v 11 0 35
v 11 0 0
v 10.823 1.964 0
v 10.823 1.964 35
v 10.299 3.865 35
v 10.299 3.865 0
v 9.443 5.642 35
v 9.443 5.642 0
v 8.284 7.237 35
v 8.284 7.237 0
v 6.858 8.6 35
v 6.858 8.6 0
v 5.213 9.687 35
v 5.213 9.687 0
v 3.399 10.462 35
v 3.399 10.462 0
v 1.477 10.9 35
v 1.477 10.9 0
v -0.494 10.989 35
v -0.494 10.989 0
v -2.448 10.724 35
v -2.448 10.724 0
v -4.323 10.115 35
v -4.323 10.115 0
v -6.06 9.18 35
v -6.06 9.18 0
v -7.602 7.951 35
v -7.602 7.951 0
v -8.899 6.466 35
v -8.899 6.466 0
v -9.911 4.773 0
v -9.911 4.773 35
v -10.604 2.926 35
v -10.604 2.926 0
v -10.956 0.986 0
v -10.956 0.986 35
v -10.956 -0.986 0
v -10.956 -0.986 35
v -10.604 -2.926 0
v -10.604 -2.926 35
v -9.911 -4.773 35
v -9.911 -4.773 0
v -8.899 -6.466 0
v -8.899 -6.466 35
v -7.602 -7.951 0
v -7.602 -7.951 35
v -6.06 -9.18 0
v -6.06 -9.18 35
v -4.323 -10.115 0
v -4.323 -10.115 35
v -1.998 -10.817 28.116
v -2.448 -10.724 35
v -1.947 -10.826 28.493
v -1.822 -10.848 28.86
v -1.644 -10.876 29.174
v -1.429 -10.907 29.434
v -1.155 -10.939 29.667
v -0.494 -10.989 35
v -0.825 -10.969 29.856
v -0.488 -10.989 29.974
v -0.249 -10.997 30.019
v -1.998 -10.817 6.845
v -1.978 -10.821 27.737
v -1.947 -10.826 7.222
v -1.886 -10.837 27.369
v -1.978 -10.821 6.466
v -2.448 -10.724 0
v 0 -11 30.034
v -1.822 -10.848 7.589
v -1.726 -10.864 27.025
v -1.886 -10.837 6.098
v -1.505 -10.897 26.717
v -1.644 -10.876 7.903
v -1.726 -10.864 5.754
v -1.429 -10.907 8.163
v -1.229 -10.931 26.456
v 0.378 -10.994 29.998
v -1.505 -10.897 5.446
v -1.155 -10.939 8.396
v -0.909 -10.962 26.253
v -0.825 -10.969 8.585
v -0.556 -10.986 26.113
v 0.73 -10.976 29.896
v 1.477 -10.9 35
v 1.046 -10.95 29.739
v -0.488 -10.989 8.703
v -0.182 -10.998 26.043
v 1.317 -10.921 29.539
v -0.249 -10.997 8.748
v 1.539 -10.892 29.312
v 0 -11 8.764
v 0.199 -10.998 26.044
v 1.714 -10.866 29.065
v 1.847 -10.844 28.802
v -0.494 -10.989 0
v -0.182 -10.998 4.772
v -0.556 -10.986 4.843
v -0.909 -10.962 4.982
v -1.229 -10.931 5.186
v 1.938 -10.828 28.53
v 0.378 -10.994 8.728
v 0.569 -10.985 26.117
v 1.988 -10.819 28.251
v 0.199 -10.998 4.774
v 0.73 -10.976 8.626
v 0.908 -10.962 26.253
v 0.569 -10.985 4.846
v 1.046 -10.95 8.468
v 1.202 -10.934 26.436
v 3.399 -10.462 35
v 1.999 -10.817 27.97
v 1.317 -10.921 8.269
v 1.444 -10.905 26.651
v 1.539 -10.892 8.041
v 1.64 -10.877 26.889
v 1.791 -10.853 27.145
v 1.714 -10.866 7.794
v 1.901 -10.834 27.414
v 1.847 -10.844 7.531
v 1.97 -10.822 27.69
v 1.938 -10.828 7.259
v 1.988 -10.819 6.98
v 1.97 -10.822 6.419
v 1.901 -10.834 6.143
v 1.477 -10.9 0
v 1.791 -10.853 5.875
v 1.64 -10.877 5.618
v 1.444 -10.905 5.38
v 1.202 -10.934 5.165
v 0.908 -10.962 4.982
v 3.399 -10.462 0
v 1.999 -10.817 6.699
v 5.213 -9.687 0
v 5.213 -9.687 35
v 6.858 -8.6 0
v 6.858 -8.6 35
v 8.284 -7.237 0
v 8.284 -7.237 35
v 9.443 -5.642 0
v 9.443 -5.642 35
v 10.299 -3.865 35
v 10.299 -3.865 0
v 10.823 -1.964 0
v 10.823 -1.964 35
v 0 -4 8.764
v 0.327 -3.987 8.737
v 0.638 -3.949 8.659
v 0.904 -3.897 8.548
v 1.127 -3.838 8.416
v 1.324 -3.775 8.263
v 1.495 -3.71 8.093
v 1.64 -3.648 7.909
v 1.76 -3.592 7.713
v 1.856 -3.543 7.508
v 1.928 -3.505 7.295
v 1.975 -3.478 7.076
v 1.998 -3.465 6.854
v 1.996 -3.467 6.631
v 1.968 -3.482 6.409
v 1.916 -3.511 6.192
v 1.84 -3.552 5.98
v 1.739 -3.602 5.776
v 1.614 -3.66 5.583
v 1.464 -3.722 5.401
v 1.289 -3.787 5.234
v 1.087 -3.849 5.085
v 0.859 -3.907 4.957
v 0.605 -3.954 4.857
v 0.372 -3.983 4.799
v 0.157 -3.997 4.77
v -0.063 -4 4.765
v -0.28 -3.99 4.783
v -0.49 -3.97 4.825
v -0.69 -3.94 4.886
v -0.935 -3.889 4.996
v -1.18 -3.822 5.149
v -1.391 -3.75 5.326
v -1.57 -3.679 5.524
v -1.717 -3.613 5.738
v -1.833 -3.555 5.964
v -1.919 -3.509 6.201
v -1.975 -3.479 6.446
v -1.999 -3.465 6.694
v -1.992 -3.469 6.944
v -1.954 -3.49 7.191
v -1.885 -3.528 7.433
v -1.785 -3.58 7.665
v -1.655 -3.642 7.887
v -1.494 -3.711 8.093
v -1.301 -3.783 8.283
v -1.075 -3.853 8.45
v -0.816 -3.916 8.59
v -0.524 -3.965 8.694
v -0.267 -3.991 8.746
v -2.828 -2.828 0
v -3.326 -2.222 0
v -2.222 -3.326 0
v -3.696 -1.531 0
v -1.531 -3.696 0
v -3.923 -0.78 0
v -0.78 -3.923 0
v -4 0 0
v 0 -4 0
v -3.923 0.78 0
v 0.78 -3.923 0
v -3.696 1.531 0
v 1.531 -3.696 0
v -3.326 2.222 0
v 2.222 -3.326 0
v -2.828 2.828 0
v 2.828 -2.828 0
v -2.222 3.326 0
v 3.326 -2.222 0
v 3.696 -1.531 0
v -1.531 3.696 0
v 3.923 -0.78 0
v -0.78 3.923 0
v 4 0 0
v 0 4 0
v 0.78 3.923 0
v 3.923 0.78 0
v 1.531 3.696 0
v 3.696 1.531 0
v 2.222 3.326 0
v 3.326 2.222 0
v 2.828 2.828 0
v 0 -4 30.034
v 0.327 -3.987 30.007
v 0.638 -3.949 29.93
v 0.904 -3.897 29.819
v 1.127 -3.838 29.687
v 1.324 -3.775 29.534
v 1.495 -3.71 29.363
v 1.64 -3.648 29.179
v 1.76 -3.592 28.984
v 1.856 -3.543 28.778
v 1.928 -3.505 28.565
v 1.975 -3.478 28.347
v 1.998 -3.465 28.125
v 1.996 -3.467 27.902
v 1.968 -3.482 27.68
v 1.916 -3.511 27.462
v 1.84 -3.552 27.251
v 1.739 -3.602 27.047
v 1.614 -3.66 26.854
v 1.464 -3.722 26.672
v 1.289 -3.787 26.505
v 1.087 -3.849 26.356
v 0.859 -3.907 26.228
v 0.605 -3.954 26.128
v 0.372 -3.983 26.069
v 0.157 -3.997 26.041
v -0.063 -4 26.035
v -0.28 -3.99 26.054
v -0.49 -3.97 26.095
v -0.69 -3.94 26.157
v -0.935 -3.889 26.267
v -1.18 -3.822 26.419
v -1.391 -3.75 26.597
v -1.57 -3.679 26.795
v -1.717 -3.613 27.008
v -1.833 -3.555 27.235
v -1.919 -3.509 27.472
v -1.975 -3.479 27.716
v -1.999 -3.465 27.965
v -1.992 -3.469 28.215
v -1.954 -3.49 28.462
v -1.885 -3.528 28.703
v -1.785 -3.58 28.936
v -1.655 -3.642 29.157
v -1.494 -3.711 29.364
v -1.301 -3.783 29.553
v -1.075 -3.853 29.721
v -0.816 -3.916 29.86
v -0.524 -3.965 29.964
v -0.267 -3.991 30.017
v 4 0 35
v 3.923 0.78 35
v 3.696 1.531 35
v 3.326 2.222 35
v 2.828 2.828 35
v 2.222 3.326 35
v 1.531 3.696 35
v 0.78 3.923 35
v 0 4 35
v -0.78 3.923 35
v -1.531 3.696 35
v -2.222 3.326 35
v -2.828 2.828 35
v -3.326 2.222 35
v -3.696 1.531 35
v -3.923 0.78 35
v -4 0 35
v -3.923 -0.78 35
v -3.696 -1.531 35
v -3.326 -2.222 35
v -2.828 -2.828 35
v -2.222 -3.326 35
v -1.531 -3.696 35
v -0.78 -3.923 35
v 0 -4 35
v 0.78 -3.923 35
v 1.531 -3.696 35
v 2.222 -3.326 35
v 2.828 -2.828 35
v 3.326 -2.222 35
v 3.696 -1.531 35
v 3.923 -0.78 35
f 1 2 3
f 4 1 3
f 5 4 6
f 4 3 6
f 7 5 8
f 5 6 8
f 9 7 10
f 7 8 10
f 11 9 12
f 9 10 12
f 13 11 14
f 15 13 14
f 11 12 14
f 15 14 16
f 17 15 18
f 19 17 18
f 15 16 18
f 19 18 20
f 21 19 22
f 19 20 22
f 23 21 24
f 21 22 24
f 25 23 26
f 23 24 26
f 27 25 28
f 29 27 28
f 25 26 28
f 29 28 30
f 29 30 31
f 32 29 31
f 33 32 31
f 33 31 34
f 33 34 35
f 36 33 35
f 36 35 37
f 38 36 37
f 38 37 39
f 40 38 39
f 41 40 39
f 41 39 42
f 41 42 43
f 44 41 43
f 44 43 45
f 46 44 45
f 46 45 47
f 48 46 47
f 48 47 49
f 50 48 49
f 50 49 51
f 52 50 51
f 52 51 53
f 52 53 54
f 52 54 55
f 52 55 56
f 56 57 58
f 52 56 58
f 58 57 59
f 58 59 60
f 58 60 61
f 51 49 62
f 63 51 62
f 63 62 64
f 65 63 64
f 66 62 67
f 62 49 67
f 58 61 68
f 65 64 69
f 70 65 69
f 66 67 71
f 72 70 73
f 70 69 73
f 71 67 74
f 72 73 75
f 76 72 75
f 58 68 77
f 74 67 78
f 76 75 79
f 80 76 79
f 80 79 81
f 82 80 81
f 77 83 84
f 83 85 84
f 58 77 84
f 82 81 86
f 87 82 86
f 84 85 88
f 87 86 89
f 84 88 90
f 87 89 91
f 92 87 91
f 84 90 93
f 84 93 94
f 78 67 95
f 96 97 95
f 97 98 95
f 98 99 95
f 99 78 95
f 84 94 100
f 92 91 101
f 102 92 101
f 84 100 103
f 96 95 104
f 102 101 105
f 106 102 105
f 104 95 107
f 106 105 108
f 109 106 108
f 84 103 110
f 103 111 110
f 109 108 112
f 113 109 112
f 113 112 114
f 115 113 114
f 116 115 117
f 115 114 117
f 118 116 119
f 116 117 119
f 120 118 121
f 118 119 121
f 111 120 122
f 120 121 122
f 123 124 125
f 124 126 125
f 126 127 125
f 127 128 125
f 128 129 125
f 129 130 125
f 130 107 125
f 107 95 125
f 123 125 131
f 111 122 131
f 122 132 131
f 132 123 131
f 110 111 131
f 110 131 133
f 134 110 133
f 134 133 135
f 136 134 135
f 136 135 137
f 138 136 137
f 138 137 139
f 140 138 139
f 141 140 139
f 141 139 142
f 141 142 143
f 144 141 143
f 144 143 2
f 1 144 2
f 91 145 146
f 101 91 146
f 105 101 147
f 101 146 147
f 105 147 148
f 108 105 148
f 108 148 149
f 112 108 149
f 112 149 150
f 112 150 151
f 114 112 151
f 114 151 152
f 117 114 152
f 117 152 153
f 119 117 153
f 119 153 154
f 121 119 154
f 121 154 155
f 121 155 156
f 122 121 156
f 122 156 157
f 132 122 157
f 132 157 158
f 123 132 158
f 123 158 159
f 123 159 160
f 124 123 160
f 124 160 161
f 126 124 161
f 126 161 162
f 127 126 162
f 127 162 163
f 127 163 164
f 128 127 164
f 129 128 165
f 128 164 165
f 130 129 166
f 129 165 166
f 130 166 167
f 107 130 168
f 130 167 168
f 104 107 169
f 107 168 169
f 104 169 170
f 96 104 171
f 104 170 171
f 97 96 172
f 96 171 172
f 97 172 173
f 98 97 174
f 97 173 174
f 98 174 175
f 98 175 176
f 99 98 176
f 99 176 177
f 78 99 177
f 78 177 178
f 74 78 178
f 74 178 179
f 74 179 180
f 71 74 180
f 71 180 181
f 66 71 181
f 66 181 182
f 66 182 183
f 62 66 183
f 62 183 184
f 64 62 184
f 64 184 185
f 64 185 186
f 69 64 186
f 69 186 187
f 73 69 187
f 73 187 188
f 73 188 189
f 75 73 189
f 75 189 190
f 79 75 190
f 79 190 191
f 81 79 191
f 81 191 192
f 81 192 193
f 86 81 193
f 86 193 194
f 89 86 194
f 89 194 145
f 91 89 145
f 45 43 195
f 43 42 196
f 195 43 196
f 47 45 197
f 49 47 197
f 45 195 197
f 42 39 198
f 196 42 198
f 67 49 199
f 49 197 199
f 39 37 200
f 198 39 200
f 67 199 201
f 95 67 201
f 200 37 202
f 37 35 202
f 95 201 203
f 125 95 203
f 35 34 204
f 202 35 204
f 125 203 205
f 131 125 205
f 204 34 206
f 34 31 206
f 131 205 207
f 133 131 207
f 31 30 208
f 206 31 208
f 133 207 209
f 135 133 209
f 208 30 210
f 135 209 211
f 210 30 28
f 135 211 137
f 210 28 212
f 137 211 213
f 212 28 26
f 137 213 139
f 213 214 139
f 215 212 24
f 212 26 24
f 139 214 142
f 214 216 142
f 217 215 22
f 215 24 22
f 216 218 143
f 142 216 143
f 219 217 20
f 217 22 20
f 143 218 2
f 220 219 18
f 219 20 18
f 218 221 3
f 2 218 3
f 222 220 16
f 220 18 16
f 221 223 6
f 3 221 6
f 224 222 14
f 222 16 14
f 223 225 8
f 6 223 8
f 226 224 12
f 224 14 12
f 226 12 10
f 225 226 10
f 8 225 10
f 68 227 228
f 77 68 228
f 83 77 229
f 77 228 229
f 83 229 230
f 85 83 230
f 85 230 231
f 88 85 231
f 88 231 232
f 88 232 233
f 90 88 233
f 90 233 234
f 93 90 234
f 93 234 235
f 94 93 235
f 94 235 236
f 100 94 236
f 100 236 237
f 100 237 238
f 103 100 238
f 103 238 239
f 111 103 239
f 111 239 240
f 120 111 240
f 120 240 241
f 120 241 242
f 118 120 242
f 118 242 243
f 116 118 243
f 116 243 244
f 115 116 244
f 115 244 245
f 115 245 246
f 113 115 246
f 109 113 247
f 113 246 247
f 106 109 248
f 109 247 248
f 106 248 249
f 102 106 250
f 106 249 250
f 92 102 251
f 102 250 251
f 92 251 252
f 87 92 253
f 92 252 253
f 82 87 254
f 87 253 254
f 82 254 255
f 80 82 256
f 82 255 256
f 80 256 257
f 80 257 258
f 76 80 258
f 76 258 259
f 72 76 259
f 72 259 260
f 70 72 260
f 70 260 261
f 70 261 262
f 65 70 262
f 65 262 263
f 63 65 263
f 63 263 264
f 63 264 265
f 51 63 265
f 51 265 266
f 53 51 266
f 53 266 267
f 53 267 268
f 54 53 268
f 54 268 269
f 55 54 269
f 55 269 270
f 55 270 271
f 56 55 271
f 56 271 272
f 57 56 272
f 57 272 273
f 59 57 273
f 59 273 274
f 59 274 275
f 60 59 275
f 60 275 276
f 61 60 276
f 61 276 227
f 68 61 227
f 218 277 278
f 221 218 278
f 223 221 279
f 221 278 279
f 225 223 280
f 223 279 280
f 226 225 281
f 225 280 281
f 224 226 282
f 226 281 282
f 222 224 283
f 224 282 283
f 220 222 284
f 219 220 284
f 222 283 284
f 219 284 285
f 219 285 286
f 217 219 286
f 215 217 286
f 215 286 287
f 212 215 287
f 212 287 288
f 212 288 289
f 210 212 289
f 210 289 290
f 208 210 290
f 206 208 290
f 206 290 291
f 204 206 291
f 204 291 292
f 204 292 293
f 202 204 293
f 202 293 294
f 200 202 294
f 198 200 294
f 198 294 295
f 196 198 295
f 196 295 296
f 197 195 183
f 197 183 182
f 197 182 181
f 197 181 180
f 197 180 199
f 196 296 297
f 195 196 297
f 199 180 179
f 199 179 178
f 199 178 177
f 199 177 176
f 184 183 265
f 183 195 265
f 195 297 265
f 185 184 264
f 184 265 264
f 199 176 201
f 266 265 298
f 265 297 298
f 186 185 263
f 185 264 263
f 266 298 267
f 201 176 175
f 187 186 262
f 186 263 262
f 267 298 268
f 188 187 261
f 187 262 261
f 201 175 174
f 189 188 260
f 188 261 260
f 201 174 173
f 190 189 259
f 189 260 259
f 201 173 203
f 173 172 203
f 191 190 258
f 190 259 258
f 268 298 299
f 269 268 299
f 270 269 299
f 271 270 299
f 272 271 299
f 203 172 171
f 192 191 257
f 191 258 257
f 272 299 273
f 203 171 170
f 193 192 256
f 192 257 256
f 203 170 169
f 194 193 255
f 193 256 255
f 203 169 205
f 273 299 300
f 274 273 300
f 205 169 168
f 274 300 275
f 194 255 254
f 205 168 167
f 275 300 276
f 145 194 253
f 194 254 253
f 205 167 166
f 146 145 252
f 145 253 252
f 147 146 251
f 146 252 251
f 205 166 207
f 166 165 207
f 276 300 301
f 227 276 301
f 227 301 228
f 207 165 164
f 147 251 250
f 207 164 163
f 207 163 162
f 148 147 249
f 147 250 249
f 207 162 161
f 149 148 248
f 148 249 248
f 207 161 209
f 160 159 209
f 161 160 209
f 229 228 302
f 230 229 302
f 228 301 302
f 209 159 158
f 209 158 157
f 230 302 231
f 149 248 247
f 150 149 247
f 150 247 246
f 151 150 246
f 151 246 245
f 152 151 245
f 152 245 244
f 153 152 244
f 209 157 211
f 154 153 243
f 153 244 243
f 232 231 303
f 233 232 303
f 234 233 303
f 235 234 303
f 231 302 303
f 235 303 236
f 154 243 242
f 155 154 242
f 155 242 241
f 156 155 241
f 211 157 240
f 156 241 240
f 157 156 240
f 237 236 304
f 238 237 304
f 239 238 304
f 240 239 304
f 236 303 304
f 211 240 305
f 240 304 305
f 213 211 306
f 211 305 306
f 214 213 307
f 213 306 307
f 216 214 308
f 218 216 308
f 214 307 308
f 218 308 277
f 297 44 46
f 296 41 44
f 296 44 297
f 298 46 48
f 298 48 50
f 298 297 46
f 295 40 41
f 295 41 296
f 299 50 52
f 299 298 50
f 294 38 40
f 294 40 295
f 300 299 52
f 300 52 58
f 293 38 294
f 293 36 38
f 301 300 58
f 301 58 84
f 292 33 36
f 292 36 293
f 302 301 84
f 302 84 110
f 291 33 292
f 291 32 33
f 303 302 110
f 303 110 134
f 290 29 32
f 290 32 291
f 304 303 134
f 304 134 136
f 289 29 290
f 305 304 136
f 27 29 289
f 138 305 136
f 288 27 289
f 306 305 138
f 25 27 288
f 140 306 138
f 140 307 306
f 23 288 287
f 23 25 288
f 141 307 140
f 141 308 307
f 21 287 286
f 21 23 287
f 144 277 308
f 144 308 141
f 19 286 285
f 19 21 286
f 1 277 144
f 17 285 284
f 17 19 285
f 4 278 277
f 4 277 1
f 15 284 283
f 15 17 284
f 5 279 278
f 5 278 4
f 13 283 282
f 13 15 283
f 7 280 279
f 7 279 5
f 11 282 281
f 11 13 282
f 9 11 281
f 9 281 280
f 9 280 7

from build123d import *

# Parameters (mm, degrees)
SKETCH_3_R          = 11
EXTRUDE_2_DEPTH     = 35
SKETCH_4_R          = 4
CUT_EXTRUDE_1_DEPTH = 35
SKETCH_5_R          = 2
CUT_EXTRUDE_2_DEPTH = 35


with BuildPart() as part:
    # 草图3 → 凸台-拉伸2 (new body)
    with BuildSketch(Plane.XY):
        Circle(SKETCH_3_R)
    extrude(amount=EXTRUDE_2_DEPTH)

    # 草图4 → 切除-拉伸1 (cut)
    with BuildSketch(Plane.XY.offset(35)):
        Circle(SKETCH_4_R)
    extrude(amount=-CUT_EXTRUDE_1_DEPTH, mode=Mode.SUBTRACT)

    # 草图5 → 切除-拉伸2 (cut)
    with BuildSketch(Plane(origin=(0, 0, 0), x_dir=(1, 0, 0), z_dir=(0, 1, 0))):
        with Locations(Location((0, -6.763631076, 0), (0, 0, 270))):
            Circle(SKETCH_5_R)
        with Locations(Location((0, -28.03443095, 0), (0, 0, 270))):
            Circle(SKETCH_5_R)
    extrude(amount=-CUT_EXTRUDE_2_DEPTH, mode=Mode.SUBTRACT)


solid = part.part
